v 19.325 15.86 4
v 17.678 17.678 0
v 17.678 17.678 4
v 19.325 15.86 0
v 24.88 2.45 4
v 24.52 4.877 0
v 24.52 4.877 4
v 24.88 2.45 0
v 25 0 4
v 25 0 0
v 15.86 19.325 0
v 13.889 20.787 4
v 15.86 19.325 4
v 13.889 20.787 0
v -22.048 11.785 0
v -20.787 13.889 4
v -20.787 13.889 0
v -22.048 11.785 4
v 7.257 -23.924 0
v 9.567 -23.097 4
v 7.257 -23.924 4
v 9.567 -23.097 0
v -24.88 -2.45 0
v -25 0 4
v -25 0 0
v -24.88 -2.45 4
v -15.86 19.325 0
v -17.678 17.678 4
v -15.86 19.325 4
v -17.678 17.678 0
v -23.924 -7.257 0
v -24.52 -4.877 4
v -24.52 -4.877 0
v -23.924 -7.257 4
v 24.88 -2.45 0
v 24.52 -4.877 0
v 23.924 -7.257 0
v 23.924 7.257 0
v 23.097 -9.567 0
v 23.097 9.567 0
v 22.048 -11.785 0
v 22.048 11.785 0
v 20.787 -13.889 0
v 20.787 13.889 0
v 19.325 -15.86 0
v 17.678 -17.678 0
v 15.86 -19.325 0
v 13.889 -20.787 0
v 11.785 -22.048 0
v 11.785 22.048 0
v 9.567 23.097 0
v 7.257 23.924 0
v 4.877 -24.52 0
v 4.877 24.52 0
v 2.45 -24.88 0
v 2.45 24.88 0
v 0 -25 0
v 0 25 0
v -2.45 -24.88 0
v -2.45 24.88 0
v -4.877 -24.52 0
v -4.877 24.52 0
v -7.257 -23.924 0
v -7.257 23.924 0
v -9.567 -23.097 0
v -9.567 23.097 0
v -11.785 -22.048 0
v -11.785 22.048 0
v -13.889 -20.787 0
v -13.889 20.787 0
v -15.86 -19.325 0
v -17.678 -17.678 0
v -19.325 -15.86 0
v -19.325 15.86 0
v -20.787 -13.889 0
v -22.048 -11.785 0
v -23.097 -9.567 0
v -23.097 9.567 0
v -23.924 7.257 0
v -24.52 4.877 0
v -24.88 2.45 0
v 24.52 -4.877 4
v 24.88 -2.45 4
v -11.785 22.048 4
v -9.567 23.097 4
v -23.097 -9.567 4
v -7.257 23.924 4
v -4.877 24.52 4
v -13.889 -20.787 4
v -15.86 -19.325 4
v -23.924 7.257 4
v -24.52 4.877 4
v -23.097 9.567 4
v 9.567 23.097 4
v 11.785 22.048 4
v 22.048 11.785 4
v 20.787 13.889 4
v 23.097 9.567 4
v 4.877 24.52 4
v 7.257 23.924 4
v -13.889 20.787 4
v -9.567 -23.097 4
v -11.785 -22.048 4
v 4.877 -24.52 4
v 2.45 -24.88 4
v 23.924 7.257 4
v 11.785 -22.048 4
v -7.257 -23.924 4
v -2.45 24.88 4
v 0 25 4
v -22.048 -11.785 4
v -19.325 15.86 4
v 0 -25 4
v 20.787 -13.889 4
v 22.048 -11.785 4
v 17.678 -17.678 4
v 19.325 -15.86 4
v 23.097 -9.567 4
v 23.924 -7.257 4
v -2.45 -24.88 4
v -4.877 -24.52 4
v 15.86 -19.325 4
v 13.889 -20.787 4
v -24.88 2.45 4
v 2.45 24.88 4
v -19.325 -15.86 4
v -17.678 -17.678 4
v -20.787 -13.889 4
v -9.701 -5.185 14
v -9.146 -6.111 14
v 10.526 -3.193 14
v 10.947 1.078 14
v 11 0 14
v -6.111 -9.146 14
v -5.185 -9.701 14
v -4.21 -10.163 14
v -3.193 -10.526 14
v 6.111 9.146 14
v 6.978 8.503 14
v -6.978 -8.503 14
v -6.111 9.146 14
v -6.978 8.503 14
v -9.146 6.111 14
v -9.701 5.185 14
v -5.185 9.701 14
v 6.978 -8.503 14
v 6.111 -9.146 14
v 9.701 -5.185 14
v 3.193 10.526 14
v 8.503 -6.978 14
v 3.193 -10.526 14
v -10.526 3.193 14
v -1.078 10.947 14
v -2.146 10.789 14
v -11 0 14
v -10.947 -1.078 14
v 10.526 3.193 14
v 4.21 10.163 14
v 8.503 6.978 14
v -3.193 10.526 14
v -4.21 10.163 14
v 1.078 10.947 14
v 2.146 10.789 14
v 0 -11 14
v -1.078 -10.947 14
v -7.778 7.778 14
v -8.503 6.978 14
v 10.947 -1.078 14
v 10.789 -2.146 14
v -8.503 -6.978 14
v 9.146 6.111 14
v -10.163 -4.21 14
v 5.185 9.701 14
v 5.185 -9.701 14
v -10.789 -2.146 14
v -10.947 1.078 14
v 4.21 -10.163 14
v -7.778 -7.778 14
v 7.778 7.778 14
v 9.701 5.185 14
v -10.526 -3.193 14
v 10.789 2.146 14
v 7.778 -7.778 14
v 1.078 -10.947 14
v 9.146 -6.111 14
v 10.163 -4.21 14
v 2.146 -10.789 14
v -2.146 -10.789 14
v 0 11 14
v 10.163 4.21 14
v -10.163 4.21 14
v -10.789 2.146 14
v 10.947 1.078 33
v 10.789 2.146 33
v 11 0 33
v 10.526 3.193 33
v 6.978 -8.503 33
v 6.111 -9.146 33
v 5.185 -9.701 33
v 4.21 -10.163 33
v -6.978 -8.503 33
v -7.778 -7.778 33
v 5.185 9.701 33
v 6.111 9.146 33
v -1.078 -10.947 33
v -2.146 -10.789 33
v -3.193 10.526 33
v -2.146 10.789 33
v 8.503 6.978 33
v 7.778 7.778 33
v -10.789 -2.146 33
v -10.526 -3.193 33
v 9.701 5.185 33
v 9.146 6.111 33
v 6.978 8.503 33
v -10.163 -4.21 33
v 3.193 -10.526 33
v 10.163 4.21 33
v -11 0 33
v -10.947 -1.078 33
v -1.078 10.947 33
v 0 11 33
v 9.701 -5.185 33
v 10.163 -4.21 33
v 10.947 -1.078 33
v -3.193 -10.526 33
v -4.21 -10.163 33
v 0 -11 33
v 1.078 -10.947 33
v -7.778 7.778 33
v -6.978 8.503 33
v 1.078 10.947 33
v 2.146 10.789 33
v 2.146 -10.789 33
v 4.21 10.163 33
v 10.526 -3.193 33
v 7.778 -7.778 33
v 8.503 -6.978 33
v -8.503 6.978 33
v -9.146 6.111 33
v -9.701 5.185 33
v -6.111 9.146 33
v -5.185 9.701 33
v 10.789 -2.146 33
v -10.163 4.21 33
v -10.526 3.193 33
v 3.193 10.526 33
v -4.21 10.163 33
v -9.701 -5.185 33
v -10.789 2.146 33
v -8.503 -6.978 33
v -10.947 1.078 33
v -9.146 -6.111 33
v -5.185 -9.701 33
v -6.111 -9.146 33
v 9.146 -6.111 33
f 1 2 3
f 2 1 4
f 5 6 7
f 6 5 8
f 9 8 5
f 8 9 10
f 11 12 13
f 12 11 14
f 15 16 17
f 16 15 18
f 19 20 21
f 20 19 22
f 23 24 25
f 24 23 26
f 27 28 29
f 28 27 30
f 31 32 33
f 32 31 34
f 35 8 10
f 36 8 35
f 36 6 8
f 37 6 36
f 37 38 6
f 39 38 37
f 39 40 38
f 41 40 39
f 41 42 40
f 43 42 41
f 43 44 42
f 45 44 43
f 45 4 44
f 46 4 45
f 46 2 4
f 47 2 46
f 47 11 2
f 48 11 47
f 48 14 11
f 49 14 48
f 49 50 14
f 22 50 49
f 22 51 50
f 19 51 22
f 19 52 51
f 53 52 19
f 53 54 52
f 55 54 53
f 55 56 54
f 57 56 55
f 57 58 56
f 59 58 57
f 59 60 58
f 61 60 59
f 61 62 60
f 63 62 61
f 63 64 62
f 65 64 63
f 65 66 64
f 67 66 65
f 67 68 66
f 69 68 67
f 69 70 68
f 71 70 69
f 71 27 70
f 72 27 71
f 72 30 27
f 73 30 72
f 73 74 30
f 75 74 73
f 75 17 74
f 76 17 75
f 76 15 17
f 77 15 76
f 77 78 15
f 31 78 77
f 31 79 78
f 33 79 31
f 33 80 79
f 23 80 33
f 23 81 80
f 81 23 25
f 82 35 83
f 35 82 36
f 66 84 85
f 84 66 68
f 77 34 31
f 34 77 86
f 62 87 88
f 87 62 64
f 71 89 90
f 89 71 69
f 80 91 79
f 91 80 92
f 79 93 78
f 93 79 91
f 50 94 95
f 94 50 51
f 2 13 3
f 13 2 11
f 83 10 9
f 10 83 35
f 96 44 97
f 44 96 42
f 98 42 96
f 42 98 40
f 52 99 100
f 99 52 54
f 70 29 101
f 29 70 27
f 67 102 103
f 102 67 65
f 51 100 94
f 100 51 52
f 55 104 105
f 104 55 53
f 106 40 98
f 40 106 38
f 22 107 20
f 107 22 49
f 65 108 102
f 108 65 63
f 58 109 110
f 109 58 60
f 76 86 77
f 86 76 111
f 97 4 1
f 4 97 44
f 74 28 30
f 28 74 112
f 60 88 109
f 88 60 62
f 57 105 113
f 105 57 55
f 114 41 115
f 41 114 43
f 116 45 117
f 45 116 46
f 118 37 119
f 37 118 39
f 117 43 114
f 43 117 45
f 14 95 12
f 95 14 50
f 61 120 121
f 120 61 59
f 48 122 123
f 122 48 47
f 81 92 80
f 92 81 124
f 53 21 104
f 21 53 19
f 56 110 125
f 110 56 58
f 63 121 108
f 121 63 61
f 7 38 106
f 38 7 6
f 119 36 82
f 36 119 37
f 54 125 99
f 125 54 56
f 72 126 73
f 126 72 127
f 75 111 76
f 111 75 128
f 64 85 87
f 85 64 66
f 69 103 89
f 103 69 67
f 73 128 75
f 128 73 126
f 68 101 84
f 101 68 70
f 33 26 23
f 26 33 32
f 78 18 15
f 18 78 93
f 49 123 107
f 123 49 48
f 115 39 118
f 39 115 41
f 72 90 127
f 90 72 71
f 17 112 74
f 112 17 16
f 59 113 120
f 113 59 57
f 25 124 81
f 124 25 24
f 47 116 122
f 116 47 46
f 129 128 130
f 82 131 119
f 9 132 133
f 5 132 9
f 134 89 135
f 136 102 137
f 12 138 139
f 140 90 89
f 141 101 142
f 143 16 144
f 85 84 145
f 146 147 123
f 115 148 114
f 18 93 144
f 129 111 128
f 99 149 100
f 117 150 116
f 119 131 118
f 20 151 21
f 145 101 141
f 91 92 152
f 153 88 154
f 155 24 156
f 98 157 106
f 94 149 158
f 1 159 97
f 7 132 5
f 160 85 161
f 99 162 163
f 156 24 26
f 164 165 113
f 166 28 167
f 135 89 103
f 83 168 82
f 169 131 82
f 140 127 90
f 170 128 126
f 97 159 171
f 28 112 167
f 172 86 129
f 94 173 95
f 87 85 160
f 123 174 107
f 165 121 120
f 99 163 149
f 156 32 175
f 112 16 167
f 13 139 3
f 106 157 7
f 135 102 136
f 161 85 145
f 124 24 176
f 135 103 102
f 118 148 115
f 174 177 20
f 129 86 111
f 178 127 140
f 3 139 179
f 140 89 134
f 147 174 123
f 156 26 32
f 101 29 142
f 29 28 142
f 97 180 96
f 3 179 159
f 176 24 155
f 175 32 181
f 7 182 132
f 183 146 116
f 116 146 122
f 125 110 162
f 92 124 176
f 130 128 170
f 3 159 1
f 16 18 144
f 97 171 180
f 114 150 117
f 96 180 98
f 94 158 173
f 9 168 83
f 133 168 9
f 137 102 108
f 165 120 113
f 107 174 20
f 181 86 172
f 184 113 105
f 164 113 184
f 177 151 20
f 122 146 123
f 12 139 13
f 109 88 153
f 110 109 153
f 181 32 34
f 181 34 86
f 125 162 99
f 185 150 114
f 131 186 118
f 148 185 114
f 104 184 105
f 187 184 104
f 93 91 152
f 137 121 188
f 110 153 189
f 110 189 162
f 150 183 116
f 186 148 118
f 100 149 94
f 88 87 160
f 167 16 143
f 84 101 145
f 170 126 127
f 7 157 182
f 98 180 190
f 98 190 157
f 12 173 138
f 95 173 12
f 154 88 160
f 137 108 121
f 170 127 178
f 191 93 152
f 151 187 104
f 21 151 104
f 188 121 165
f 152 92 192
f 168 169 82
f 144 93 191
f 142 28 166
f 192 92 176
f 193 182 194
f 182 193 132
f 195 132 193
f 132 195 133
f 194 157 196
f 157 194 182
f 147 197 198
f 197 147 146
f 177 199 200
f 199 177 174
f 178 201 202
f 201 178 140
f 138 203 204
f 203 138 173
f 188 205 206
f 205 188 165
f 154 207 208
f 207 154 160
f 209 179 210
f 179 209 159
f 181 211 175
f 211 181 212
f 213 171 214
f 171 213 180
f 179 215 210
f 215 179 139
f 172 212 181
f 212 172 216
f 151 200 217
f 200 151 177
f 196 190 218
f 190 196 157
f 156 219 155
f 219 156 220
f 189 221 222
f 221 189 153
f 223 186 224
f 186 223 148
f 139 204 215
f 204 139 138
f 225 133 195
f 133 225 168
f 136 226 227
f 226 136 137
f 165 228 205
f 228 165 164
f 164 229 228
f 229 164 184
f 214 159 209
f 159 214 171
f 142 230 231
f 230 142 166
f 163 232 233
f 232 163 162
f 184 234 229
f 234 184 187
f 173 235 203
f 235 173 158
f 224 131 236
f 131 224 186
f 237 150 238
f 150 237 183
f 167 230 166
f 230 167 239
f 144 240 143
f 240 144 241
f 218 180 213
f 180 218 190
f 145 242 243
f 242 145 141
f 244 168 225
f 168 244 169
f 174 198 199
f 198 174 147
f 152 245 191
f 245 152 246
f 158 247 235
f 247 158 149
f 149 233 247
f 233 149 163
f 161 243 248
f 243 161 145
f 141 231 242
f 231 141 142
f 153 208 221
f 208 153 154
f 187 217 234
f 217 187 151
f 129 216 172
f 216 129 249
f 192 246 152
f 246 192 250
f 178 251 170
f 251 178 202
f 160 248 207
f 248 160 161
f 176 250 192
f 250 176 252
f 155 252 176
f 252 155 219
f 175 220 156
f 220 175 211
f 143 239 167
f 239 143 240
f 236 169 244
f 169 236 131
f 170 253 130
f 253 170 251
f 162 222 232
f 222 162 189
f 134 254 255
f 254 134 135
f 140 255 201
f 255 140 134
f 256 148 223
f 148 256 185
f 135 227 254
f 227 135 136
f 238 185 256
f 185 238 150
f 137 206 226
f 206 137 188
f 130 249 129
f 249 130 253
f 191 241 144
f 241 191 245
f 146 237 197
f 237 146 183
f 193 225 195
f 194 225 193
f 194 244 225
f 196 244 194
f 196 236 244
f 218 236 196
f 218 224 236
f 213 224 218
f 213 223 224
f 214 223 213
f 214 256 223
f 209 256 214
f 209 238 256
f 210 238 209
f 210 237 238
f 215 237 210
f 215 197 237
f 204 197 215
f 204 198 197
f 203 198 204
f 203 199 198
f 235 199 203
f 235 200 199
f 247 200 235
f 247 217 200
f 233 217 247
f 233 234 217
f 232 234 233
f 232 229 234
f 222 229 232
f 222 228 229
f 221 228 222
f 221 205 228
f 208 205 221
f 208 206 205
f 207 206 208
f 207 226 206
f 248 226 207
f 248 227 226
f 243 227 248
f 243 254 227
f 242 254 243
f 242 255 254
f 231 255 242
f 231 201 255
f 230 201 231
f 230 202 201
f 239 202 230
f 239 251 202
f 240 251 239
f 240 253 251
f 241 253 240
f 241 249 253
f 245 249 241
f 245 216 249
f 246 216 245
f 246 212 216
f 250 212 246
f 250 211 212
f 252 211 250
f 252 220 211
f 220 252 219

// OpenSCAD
// 1.5 mL microcentrifuge tube stand for analytical balance
// Print orientation: standing up, base on XY plane at z=0, centred on origin.

// ---- Dimensions (mm) ----
base_diameter   = 50;   // base disc diameter
base_height     = 4;    // base disc height (z = 0..4)
cone_top_diam   = 22;   // cone top diameter at z=14
cone_top_z      = 14;   // cone top height
column_diameter = 22;   // column diameter
column_top_z    = 33;   // column top height
seat_diameter   = 11;   // tube seat diameter
seat_bottom_z   = 23;   // seat bottom height
tip_diameter    = 3;    // tube tip diameter
tip_bottom_z    = 6;    // tip cone bottom height
window_width    = 4;    // viewing window width in Y
window_bottom_z = 18;   // window bottom height
window_top_z    = 30;   // window top height
cut_margin      = 1;    // extra mm for clean cuts

$fn = 64;               // resolution for curved shapes

// ---- Build the solid ----
// Base disc
union() {
    // Base disc (z = 0..4)
    cylinder(h = base_height, d = base_diameter);

    // Cone (z = 4..14)
    translate([0, 0, base_height])
        cylinder(h = cone_top_z - base_height,
                 d1 = base_diameter,
                 d2 = cone_top_diam);

    // Column (z = 14..33)
    translate([0, 0, cone_top_z])
        cylinder(h = column_top_z - cone_top_z,
                 d = column_diameter);

    // Tube seat (z = 23..33)
    translate([0, 0, seat_bottom_z])
        cylinder(h = column_top_z - seat_bottom_z,
                 d = seat_diameter);

    // Tube tip cone (z = 6..23)
    translate([0, 0, tip_bottom_z])
        cylinder(h = seat_bottom_z - tip_bottom_z,
                 d1 = tip_diameter,
                 d2 = seat_diameter);
}

// ---- Cut the viewing window (straight through column wall on +X side) ----
// The window is a 4 mm wide (Y) rectangular prism cut from the +X side,
// extending from the seat to the outside, between z = 18 and z = 30.
// It is placed so its inner face is at the seat wall (x = seat_diameter/2)
// and it extends past the column outer wall (x = column_diameter/2).
// The prism is centred in Y at 0 and spans Y from -window_width/2 to +window_width/2.
// It extends in X from the seat wall to beyond the column wall.
// It extends in Z from window_bottom_z to window_top_z.
// We use a difference to cut this prism out of the solid.
difference() {
    // Solid (as above)
    union() {
        cylinder(h = base_height, d = base_diameter);
        translate([0, 0, base_height])
            cylinder(h = cone_top_z - base_height,
                     d1 = base_diameter,
                     d2 = cone_top_diam);
        translate([0, 0, cone_top_z])
            cylinder(h = column_top_z - cone_top_z,
                     d = column_diameter);
        translate([0, 0, seat_bottom_z])
            cylinder(h = column_top_z - seat_bottom_z,
                     d = seat_diameter);
        translate([0, 0, tip_bottom_z])
            cylinder(h = seat_bottom_z - tip_bottom_z,
                     d1 = tip_diameter,
                     d2 = seat_diameter);
    }

    // Viewing window cut
    // The window is on the +X side, so it starts at x = seat_diameter/2
    // and extends to x = column_diameter/2 + cut_margin.
    // It is centred in Y at 0, width = window_width.
    // It spans z from window_bottom_z to window_top_z.
    translate([seat_diameter/2, 0, window_bottom_z])
        cube([column_diameter/2 - seat_diameter/2 + cut_margin,
              window_width,
              window_top_z - window_bottom_z]);
}
